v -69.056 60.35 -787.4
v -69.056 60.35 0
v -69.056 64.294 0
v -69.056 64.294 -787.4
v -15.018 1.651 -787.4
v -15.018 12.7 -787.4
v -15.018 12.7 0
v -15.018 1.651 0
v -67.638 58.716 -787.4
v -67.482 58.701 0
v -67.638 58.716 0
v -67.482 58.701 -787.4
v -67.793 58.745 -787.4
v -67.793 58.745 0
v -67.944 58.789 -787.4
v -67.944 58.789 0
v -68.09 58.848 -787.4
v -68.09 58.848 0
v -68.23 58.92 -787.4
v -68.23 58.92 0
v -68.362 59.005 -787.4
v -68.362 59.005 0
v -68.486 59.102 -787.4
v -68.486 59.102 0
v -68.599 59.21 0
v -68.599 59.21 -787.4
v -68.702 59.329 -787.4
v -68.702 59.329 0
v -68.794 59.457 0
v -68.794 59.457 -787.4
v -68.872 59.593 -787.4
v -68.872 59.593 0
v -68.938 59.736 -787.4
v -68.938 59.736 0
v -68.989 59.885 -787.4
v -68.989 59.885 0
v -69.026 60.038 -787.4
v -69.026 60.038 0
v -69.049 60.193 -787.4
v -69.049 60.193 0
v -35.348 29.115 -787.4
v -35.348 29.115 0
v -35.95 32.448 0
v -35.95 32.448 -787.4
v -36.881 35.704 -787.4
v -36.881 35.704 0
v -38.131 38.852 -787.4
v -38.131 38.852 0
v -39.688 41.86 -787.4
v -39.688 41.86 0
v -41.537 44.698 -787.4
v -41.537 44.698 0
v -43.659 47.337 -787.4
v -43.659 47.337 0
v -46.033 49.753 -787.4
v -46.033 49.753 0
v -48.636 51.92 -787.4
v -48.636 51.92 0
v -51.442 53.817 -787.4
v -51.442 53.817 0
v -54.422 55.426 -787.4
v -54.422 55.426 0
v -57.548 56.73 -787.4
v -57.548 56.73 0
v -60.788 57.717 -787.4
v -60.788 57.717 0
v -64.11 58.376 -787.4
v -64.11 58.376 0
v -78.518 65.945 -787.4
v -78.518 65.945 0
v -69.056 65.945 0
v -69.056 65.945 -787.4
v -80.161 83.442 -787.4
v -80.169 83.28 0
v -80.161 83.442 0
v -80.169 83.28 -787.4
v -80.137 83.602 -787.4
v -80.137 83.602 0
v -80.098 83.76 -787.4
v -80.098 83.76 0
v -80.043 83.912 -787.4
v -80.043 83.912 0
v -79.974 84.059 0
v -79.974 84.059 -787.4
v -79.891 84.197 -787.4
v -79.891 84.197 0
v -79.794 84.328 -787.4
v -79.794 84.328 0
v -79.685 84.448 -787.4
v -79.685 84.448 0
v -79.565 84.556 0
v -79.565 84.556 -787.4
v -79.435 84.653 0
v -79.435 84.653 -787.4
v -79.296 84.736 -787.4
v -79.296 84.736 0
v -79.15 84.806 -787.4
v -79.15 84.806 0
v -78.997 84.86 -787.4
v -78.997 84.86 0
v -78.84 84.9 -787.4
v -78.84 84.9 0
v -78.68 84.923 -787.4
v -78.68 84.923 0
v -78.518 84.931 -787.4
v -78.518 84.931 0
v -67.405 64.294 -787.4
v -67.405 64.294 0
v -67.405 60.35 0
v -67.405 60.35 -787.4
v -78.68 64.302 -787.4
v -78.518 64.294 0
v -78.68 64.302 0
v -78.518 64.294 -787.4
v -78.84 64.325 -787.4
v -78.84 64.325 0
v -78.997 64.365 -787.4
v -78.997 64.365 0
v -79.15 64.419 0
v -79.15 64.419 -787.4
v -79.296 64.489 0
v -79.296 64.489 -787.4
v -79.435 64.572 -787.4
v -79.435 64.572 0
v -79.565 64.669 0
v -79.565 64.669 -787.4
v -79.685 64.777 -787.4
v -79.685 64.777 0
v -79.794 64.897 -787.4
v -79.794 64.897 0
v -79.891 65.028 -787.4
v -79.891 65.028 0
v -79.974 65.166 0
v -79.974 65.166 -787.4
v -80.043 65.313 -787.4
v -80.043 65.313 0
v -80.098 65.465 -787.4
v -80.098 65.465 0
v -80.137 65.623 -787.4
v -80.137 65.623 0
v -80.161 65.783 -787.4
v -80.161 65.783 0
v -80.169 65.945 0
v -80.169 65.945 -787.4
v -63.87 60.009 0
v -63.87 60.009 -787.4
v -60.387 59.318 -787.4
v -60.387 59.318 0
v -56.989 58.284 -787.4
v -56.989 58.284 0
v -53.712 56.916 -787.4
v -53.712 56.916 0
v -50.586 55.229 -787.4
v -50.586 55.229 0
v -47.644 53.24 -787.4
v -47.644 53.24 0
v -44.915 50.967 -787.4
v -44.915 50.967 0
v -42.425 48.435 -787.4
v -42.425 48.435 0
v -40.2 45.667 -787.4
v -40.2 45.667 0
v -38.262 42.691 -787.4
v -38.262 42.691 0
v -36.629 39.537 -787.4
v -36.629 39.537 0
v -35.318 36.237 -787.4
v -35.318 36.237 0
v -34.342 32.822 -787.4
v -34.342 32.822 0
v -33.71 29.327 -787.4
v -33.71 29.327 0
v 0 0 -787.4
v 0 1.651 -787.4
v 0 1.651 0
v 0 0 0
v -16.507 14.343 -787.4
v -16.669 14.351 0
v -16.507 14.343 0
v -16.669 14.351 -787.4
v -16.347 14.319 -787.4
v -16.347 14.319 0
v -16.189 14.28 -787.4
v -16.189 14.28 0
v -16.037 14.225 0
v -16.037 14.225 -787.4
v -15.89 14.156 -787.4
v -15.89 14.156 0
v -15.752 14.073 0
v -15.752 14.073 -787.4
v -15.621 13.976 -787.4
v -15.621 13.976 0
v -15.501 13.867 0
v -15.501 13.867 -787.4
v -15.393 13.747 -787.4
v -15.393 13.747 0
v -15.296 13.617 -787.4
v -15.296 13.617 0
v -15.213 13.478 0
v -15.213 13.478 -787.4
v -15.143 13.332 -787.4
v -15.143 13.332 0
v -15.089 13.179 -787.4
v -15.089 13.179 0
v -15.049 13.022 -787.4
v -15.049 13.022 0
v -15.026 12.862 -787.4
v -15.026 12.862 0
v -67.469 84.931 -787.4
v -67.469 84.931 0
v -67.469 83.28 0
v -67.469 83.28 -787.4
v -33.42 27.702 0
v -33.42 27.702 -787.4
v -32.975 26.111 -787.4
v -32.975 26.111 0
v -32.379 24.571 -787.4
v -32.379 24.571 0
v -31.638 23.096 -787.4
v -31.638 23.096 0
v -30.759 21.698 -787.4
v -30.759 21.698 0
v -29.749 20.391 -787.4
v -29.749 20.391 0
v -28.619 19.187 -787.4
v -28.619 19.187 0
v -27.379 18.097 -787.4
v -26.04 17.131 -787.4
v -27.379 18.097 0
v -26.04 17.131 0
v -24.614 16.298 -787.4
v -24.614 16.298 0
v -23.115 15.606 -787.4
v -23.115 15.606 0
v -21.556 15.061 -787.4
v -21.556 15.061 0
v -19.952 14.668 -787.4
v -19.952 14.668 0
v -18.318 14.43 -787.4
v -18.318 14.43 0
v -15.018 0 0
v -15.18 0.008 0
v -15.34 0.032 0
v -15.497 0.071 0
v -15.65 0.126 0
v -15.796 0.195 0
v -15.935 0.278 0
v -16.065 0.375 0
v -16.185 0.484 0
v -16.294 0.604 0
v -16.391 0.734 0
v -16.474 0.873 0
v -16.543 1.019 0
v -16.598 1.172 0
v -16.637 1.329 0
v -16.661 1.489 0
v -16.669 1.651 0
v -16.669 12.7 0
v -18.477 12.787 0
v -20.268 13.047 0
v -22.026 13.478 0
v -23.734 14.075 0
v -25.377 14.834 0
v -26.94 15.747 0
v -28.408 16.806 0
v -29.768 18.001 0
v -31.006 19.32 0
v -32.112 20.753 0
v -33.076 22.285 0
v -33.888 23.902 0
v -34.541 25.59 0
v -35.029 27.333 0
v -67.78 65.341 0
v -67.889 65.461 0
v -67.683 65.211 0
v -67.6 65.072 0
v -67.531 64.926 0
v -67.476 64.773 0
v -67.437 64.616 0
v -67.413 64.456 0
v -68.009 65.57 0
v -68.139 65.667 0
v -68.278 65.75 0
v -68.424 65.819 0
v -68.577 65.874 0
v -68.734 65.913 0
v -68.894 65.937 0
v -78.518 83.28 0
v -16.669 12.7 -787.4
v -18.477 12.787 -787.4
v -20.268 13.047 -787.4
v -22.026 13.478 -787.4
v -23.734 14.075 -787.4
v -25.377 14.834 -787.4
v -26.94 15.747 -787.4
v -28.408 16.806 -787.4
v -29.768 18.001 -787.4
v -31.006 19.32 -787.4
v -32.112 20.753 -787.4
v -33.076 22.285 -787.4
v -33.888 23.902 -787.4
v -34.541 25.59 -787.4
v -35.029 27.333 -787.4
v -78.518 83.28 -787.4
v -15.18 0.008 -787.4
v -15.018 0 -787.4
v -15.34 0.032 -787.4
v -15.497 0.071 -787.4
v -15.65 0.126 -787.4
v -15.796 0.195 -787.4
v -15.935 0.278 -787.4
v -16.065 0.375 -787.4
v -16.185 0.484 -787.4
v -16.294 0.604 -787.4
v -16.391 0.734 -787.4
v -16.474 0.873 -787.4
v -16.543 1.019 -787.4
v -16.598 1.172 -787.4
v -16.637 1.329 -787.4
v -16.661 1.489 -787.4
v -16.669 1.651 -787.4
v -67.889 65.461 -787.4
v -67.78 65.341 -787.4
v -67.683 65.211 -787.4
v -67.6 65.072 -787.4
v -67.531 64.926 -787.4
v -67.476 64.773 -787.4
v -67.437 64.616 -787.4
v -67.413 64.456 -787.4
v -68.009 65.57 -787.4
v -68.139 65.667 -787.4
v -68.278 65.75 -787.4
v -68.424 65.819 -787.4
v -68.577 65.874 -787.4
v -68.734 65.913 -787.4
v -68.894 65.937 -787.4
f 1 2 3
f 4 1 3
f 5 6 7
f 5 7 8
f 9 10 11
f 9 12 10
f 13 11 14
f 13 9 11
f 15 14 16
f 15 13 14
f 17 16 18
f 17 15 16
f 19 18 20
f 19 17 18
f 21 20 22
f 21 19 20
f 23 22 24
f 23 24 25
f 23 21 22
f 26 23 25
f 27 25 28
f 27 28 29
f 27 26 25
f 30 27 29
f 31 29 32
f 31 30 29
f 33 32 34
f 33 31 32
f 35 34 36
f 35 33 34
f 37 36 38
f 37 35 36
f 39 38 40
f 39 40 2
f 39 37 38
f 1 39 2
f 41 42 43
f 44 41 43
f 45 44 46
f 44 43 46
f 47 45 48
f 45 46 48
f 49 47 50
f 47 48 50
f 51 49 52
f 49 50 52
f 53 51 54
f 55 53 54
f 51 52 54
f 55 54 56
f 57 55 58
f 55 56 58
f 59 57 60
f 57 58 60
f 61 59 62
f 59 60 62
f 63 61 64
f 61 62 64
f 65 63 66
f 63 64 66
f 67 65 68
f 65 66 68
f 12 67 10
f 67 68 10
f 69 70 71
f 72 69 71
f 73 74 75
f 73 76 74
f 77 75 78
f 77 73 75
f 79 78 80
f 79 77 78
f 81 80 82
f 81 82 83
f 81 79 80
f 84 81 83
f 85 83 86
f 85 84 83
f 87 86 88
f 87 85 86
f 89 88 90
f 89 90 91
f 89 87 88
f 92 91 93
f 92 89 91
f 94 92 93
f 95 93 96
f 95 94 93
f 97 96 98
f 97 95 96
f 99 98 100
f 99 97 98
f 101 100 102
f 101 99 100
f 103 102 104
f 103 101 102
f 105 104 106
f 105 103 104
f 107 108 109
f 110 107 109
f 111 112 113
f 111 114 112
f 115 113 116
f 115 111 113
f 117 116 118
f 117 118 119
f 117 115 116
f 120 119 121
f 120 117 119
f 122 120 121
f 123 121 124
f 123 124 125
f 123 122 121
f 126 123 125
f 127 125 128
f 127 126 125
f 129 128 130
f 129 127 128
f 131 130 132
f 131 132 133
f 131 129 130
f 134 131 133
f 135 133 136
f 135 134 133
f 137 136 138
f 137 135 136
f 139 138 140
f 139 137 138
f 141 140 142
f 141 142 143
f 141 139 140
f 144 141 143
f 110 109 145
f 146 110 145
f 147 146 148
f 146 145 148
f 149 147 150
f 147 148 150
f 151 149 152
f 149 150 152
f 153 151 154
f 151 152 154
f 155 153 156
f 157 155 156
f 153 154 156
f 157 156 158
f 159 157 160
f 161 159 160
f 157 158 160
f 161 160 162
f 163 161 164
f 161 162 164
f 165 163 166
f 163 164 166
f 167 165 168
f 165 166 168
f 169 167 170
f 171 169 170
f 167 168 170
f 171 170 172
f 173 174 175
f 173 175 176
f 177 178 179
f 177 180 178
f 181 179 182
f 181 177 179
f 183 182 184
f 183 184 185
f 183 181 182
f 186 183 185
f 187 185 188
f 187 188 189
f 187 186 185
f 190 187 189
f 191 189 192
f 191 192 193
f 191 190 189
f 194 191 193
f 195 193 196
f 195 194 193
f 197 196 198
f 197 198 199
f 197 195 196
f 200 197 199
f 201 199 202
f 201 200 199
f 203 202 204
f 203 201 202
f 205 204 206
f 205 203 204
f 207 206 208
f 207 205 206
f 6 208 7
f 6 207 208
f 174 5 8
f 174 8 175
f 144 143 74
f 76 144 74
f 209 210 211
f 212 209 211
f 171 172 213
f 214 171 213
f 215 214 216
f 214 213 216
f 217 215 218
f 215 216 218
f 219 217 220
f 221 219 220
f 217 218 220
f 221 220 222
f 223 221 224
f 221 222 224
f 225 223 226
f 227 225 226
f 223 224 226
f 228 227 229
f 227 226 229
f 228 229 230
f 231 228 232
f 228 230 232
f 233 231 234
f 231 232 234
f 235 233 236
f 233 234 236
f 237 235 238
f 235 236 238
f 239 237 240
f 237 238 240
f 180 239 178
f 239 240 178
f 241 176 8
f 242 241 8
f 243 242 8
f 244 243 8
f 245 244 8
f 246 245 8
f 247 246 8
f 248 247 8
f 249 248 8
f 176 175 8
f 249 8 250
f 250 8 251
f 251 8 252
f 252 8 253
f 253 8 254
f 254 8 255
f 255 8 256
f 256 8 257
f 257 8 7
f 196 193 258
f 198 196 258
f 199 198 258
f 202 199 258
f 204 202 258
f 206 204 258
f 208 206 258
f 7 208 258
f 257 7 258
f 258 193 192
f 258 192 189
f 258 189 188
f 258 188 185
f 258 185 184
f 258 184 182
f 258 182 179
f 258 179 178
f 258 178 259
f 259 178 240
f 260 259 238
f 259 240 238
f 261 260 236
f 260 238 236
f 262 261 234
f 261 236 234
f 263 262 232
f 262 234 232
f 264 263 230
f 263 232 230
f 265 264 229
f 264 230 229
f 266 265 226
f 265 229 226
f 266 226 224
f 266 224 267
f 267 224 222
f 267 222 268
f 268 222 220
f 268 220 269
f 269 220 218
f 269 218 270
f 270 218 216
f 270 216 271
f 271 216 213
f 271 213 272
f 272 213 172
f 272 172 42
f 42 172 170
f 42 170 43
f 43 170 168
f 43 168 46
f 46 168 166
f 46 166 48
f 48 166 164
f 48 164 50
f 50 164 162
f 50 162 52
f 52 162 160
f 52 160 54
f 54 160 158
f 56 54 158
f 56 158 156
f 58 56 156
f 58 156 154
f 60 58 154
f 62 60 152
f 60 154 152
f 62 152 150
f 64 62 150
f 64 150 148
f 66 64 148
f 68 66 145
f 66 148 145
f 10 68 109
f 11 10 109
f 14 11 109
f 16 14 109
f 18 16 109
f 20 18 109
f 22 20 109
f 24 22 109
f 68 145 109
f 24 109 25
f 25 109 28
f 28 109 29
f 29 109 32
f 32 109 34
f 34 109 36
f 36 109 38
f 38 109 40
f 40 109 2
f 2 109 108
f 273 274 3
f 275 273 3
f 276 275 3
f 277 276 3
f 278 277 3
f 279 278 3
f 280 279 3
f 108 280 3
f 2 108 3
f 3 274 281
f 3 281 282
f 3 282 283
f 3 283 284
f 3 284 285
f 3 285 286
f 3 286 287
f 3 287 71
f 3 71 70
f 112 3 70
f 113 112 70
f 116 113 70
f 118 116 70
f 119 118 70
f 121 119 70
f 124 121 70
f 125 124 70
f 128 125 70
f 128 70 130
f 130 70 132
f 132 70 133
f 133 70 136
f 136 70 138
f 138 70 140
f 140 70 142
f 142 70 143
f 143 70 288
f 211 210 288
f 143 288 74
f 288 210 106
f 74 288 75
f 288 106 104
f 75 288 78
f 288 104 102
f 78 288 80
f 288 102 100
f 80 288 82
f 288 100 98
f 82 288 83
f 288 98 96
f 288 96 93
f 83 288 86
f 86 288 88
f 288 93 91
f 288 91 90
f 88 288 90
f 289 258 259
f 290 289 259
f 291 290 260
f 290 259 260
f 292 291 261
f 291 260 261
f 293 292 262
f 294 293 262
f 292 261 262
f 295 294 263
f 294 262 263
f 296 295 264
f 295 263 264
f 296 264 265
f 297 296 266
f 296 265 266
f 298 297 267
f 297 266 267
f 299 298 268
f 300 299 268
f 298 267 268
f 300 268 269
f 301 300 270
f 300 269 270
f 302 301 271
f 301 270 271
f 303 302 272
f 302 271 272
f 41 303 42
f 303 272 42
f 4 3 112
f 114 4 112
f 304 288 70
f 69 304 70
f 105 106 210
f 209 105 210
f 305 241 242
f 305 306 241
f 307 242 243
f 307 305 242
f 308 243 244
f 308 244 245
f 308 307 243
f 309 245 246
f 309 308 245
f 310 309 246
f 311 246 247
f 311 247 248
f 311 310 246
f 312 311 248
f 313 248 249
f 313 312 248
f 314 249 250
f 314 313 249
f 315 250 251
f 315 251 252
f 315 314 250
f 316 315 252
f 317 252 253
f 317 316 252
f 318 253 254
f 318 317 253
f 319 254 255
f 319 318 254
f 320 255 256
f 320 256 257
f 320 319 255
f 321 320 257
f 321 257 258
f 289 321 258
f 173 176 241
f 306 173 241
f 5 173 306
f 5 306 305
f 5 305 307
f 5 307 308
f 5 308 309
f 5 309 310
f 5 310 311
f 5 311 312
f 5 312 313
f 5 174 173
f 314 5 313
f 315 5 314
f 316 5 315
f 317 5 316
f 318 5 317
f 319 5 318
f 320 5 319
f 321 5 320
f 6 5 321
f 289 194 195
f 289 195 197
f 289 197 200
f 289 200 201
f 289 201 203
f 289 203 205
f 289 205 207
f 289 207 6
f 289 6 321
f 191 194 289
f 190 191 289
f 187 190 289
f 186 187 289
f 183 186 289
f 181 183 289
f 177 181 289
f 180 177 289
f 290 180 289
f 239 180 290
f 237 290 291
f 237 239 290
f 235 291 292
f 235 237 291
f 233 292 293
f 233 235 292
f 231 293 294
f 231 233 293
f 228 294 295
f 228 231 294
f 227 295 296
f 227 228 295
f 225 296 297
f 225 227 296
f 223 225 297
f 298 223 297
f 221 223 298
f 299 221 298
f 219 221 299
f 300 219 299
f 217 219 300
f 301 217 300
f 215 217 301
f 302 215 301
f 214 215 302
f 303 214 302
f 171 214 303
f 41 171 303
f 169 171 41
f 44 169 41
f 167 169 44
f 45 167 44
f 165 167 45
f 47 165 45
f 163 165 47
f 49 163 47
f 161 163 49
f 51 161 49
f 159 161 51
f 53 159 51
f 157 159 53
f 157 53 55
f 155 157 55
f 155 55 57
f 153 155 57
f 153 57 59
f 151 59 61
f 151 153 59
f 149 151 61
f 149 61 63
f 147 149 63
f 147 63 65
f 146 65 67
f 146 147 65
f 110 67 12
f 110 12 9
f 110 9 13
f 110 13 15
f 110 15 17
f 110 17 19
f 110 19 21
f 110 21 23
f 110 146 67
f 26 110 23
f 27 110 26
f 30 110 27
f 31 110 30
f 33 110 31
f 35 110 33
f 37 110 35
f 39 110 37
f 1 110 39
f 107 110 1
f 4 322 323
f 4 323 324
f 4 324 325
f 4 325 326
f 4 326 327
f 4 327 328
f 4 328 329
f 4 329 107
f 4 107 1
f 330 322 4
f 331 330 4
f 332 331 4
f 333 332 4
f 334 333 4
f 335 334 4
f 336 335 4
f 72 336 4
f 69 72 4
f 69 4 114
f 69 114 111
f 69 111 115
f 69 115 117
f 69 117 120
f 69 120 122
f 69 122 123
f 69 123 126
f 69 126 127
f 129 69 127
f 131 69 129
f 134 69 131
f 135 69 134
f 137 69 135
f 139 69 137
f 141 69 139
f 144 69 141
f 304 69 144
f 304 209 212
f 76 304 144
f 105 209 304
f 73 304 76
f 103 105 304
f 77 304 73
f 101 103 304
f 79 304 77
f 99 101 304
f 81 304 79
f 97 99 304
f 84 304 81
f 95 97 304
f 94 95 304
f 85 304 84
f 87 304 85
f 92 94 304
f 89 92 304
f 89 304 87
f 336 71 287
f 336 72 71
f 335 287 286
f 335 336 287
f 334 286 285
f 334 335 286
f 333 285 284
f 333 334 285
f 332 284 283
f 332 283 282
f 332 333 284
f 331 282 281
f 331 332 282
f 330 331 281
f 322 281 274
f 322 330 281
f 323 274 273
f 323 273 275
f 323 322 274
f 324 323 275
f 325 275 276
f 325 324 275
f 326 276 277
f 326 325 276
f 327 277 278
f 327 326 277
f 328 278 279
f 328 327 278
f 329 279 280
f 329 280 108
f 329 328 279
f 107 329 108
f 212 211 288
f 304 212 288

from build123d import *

# Parameters (mm, degrees)
EXTRUDE_THIN1_DEPTH = 787.4
FILLET1_R           = 1.651


with BuildPart() as part:
    # Sketch1 → Extrude-Thin1 (new body)
    with BuildSketch(Plane.XY):
        with BuildLine():
            Line((0, 0), (-16.66875, 0))
            Line((-16.66875, 0), (-16.66875, 12.7))
            ThreePointArc((-16.66875, 12.7), (-29.102138, 17.386858), (-35.347799, 29.114922))
            ThreePointArc((-35.347799, 29.114922), (-46.618799, 50.279536), (-69.05625, 58.7375))
            Line((-69.05625, 58.7375), (-69.05625, 64.29375))
            Line((-69.05625, 64.29375), (-80.16875, 64.29375))
            Line((-80.16875, 64.29375), (-80.16875, 84.93125))
            Line((-80.16875, 84.93125), (-67.46875, 84.93125))
            Line((-67.46875, 84.93125), (-67.46875, 83.28025))
            Line((-67.46875, 83.28025), (-78.51775, 83.28025))
            Line((-78.51775, 83.28025), (-78.51775, 65.94475))
            Line((-78.51775, 65.94475), (-67.40525, 65.94475))
            Line((-67.40525, 65.94475), (-67.40525, 60.35024))
            ThreePointArc((-67.40525, 60.35024), (-44.915012, 50.967453), (-33.710486, 29.327071))
            ThreePointArc((-33.710486, 29.327071), (-27.378357, 18.096412), (-15.01775, 14.430495))
            Line((-15.01775, 14.430495), (-15.01775, 1.651))
            Line((-15.01775, 1.651), (0, 1.651))
            Line((0, 1.651), (0, 0))
        make_face()
    extrude(amount=-EXTRUDE_THIN1_DEPTH)

    # Fillet1
    fillet1_edges = [part.edges().sort_by_distance(p)[0] for p in [
        (-67.40525, 65.94475, -393.7),
        (-15.01775, 14.430495, -393.7),
        (-16.66875, 0, -393.7),
        (-69.05625, 58.7375, -393.7),
        (-80.16875, 64.29375, -393.7),
        (-80.16875, 84.93125, -393.7),
    ]]
    fillet(fillet1_edges, radius=FILLET1_R)


solid = part.part
